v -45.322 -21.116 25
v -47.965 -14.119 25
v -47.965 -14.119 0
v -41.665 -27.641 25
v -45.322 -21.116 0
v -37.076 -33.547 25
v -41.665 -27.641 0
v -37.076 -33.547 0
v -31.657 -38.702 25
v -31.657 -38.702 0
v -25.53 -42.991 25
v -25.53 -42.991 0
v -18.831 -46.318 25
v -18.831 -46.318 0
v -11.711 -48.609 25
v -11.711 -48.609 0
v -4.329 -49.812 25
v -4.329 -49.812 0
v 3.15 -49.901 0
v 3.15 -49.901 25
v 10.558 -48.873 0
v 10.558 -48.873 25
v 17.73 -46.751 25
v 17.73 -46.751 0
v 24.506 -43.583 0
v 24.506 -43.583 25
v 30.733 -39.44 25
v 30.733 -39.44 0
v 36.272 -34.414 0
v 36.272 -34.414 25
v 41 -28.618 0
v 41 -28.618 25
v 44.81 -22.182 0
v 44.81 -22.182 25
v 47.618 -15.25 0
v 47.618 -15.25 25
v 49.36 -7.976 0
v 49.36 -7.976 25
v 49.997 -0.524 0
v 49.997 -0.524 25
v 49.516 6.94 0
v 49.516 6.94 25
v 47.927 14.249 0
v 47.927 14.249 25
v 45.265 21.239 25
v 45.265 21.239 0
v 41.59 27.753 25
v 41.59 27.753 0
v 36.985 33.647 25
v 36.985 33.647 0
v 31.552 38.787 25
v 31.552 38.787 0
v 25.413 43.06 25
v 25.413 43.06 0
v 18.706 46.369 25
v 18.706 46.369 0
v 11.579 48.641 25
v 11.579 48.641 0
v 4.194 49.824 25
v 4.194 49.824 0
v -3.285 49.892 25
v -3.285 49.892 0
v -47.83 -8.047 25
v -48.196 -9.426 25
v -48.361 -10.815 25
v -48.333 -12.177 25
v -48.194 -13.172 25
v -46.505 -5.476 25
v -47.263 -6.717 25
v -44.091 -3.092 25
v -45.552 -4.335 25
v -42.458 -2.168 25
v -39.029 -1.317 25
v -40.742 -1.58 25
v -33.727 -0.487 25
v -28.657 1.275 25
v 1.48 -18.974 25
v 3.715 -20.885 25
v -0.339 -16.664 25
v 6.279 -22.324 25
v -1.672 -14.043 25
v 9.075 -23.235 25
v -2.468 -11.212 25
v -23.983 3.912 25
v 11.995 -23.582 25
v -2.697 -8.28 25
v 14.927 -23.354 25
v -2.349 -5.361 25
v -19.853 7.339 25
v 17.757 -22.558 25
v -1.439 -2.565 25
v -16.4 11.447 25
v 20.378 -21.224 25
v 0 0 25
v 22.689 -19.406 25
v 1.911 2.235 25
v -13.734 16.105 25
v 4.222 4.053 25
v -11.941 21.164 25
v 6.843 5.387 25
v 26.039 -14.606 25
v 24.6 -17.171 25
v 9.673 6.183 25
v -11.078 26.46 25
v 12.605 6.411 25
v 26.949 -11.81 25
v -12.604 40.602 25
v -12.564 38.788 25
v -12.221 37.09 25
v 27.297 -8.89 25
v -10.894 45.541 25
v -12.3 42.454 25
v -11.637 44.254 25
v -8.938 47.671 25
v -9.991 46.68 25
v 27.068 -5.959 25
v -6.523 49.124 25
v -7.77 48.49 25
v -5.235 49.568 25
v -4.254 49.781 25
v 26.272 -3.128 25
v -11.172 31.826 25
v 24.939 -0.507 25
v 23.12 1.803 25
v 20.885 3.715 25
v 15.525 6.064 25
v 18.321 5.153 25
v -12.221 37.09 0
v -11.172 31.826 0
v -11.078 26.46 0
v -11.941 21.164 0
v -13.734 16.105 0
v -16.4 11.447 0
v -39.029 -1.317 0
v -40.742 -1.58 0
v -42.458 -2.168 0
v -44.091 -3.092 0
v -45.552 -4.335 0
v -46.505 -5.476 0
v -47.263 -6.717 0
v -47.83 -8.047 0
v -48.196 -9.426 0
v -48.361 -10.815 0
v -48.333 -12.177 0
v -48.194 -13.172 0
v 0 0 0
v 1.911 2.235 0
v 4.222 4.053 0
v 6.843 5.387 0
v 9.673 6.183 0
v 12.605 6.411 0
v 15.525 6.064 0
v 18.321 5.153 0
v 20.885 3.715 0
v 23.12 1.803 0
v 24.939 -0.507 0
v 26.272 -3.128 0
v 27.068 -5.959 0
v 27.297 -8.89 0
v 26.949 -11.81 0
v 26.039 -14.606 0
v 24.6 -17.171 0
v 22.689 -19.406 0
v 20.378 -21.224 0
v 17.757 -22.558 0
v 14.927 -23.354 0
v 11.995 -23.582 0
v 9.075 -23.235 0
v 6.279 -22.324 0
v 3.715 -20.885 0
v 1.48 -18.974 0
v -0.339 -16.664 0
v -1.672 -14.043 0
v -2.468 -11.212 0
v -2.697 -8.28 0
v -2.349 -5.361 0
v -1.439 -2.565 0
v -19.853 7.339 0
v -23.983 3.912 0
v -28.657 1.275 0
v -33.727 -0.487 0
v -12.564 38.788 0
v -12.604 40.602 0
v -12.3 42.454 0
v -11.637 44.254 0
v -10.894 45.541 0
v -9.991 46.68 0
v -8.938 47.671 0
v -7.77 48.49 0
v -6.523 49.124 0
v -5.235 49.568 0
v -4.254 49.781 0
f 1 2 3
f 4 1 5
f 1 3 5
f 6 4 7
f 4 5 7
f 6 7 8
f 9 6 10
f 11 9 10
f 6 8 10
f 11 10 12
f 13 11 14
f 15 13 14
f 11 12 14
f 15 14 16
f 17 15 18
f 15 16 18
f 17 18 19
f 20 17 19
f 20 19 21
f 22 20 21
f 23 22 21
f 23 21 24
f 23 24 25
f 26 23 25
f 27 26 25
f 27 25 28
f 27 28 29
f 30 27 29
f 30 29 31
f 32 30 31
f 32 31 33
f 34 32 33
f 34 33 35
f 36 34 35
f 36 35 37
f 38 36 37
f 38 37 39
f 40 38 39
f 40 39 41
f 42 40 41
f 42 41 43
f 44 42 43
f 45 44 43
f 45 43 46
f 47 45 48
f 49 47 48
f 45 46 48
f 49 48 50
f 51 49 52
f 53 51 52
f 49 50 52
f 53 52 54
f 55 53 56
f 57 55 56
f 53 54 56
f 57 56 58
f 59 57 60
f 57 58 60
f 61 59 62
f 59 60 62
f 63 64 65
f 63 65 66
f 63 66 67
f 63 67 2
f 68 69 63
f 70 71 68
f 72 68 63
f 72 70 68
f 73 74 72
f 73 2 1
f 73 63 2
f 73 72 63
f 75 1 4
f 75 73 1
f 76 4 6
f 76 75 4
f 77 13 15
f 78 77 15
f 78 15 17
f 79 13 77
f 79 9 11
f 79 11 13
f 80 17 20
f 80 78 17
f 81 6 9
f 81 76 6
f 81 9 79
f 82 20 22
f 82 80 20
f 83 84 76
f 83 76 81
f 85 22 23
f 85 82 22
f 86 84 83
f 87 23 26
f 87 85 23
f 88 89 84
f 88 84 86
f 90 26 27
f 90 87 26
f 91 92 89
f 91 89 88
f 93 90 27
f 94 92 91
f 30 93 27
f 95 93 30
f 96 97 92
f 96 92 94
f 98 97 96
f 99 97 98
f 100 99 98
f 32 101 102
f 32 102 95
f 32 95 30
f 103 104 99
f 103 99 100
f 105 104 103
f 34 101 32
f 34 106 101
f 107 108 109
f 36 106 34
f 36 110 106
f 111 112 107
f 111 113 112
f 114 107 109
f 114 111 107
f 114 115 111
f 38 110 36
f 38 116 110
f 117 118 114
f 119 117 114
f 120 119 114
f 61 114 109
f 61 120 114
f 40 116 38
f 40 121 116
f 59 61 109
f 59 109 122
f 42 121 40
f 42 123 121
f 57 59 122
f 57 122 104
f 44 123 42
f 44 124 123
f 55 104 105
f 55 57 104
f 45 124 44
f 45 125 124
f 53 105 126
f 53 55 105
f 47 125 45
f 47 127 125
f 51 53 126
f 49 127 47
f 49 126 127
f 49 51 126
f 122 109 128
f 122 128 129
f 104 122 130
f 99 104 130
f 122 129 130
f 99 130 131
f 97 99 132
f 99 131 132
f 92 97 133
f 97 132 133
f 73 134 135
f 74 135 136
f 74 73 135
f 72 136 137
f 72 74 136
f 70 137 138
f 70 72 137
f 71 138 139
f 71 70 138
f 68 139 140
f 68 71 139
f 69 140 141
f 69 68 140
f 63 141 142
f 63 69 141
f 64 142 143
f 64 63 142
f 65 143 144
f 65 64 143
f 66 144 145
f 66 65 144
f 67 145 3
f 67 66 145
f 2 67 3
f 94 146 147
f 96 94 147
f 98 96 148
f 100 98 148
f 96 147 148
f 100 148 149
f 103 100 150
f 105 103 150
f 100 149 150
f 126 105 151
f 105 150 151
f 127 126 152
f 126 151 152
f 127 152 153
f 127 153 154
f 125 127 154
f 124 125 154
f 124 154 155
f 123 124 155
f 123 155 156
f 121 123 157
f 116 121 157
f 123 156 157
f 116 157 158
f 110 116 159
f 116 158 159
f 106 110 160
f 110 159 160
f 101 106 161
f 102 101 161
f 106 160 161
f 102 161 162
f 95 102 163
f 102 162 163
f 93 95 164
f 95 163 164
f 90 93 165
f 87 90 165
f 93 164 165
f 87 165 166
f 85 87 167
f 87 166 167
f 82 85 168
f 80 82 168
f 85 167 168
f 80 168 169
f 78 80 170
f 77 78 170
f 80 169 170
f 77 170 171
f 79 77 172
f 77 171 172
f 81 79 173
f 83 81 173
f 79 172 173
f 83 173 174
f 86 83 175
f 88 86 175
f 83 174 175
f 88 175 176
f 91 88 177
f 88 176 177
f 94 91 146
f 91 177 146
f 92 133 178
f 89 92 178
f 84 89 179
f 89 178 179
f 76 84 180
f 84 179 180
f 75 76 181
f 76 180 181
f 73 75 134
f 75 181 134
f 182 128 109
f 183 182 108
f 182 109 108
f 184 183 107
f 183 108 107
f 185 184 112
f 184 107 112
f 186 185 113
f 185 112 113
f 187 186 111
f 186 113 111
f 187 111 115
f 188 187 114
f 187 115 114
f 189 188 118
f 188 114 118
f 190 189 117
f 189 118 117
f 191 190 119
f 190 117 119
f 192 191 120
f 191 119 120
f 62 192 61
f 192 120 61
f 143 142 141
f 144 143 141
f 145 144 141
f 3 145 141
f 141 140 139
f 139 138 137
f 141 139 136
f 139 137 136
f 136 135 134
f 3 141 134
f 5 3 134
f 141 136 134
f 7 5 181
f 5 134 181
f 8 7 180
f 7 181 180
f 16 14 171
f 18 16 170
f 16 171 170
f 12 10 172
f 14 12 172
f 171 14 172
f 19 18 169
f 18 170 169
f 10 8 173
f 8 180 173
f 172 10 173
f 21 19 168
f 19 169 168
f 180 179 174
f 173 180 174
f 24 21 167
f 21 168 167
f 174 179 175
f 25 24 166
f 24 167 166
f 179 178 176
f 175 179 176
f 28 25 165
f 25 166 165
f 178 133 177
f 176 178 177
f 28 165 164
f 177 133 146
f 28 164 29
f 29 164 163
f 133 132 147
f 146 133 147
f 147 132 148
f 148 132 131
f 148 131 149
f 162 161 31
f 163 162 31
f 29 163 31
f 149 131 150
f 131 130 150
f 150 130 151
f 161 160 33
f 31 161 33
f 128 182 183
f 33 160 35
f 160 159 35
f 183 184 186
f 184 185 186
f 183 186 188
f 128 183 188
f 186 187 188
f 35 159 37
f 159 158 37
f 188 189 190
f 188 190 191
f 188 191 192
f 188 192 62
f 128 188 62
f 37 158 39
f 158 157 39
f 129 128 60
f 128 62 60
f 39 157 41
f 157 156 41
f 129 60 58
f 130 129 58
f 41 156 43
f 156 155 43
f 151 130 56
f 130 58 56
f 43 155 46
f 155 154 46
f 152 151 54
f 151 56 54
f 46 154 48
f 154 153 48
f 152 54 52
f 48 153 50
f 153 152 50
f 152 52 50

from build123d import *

# Parameters (mm, degrees)
F1_DEPTH = 25
F2_R     = 10


with BuildPart() as f1:
    # F0 (on Top) → F1 (new body)
    with BuildSketch(Plane.XY):
        with BuildLine():
            ThreePointArc((-16.4, 11.447270417), (-31.325290702, 0.2209930836), (-50, 0))
            ThreePointArc((-50, 0), (41, -28.6181760425), (-17.24, 46.9338087097))
            ThreePointArc((-17.24, 46.9338087097), (-11.0084011763, 29.3281056165), (-16.4, 11.447270417))
        make_face()
        with BuildLine():
            ThreePointArc((27.3, -8.5854528128), (7.8, -22.894540834), (0, 0))
            ThreePointArc((0, 0), (16.8, 5.7236352085), (27.3, -8.5854528128))
        make_face(mode=Mode.SUBTRACT)
    extrude(amount=F1_DEPTH)

    # F2
    f2_edges = [f1.edges().sort_by_distance(p)[0] for p in [
        (-50, 0, 12.5),
        (-17.24, 46.933809, 12.5),
    ]]
    fillet(f2_edges, radius=F2_R)


solid = f1.part
